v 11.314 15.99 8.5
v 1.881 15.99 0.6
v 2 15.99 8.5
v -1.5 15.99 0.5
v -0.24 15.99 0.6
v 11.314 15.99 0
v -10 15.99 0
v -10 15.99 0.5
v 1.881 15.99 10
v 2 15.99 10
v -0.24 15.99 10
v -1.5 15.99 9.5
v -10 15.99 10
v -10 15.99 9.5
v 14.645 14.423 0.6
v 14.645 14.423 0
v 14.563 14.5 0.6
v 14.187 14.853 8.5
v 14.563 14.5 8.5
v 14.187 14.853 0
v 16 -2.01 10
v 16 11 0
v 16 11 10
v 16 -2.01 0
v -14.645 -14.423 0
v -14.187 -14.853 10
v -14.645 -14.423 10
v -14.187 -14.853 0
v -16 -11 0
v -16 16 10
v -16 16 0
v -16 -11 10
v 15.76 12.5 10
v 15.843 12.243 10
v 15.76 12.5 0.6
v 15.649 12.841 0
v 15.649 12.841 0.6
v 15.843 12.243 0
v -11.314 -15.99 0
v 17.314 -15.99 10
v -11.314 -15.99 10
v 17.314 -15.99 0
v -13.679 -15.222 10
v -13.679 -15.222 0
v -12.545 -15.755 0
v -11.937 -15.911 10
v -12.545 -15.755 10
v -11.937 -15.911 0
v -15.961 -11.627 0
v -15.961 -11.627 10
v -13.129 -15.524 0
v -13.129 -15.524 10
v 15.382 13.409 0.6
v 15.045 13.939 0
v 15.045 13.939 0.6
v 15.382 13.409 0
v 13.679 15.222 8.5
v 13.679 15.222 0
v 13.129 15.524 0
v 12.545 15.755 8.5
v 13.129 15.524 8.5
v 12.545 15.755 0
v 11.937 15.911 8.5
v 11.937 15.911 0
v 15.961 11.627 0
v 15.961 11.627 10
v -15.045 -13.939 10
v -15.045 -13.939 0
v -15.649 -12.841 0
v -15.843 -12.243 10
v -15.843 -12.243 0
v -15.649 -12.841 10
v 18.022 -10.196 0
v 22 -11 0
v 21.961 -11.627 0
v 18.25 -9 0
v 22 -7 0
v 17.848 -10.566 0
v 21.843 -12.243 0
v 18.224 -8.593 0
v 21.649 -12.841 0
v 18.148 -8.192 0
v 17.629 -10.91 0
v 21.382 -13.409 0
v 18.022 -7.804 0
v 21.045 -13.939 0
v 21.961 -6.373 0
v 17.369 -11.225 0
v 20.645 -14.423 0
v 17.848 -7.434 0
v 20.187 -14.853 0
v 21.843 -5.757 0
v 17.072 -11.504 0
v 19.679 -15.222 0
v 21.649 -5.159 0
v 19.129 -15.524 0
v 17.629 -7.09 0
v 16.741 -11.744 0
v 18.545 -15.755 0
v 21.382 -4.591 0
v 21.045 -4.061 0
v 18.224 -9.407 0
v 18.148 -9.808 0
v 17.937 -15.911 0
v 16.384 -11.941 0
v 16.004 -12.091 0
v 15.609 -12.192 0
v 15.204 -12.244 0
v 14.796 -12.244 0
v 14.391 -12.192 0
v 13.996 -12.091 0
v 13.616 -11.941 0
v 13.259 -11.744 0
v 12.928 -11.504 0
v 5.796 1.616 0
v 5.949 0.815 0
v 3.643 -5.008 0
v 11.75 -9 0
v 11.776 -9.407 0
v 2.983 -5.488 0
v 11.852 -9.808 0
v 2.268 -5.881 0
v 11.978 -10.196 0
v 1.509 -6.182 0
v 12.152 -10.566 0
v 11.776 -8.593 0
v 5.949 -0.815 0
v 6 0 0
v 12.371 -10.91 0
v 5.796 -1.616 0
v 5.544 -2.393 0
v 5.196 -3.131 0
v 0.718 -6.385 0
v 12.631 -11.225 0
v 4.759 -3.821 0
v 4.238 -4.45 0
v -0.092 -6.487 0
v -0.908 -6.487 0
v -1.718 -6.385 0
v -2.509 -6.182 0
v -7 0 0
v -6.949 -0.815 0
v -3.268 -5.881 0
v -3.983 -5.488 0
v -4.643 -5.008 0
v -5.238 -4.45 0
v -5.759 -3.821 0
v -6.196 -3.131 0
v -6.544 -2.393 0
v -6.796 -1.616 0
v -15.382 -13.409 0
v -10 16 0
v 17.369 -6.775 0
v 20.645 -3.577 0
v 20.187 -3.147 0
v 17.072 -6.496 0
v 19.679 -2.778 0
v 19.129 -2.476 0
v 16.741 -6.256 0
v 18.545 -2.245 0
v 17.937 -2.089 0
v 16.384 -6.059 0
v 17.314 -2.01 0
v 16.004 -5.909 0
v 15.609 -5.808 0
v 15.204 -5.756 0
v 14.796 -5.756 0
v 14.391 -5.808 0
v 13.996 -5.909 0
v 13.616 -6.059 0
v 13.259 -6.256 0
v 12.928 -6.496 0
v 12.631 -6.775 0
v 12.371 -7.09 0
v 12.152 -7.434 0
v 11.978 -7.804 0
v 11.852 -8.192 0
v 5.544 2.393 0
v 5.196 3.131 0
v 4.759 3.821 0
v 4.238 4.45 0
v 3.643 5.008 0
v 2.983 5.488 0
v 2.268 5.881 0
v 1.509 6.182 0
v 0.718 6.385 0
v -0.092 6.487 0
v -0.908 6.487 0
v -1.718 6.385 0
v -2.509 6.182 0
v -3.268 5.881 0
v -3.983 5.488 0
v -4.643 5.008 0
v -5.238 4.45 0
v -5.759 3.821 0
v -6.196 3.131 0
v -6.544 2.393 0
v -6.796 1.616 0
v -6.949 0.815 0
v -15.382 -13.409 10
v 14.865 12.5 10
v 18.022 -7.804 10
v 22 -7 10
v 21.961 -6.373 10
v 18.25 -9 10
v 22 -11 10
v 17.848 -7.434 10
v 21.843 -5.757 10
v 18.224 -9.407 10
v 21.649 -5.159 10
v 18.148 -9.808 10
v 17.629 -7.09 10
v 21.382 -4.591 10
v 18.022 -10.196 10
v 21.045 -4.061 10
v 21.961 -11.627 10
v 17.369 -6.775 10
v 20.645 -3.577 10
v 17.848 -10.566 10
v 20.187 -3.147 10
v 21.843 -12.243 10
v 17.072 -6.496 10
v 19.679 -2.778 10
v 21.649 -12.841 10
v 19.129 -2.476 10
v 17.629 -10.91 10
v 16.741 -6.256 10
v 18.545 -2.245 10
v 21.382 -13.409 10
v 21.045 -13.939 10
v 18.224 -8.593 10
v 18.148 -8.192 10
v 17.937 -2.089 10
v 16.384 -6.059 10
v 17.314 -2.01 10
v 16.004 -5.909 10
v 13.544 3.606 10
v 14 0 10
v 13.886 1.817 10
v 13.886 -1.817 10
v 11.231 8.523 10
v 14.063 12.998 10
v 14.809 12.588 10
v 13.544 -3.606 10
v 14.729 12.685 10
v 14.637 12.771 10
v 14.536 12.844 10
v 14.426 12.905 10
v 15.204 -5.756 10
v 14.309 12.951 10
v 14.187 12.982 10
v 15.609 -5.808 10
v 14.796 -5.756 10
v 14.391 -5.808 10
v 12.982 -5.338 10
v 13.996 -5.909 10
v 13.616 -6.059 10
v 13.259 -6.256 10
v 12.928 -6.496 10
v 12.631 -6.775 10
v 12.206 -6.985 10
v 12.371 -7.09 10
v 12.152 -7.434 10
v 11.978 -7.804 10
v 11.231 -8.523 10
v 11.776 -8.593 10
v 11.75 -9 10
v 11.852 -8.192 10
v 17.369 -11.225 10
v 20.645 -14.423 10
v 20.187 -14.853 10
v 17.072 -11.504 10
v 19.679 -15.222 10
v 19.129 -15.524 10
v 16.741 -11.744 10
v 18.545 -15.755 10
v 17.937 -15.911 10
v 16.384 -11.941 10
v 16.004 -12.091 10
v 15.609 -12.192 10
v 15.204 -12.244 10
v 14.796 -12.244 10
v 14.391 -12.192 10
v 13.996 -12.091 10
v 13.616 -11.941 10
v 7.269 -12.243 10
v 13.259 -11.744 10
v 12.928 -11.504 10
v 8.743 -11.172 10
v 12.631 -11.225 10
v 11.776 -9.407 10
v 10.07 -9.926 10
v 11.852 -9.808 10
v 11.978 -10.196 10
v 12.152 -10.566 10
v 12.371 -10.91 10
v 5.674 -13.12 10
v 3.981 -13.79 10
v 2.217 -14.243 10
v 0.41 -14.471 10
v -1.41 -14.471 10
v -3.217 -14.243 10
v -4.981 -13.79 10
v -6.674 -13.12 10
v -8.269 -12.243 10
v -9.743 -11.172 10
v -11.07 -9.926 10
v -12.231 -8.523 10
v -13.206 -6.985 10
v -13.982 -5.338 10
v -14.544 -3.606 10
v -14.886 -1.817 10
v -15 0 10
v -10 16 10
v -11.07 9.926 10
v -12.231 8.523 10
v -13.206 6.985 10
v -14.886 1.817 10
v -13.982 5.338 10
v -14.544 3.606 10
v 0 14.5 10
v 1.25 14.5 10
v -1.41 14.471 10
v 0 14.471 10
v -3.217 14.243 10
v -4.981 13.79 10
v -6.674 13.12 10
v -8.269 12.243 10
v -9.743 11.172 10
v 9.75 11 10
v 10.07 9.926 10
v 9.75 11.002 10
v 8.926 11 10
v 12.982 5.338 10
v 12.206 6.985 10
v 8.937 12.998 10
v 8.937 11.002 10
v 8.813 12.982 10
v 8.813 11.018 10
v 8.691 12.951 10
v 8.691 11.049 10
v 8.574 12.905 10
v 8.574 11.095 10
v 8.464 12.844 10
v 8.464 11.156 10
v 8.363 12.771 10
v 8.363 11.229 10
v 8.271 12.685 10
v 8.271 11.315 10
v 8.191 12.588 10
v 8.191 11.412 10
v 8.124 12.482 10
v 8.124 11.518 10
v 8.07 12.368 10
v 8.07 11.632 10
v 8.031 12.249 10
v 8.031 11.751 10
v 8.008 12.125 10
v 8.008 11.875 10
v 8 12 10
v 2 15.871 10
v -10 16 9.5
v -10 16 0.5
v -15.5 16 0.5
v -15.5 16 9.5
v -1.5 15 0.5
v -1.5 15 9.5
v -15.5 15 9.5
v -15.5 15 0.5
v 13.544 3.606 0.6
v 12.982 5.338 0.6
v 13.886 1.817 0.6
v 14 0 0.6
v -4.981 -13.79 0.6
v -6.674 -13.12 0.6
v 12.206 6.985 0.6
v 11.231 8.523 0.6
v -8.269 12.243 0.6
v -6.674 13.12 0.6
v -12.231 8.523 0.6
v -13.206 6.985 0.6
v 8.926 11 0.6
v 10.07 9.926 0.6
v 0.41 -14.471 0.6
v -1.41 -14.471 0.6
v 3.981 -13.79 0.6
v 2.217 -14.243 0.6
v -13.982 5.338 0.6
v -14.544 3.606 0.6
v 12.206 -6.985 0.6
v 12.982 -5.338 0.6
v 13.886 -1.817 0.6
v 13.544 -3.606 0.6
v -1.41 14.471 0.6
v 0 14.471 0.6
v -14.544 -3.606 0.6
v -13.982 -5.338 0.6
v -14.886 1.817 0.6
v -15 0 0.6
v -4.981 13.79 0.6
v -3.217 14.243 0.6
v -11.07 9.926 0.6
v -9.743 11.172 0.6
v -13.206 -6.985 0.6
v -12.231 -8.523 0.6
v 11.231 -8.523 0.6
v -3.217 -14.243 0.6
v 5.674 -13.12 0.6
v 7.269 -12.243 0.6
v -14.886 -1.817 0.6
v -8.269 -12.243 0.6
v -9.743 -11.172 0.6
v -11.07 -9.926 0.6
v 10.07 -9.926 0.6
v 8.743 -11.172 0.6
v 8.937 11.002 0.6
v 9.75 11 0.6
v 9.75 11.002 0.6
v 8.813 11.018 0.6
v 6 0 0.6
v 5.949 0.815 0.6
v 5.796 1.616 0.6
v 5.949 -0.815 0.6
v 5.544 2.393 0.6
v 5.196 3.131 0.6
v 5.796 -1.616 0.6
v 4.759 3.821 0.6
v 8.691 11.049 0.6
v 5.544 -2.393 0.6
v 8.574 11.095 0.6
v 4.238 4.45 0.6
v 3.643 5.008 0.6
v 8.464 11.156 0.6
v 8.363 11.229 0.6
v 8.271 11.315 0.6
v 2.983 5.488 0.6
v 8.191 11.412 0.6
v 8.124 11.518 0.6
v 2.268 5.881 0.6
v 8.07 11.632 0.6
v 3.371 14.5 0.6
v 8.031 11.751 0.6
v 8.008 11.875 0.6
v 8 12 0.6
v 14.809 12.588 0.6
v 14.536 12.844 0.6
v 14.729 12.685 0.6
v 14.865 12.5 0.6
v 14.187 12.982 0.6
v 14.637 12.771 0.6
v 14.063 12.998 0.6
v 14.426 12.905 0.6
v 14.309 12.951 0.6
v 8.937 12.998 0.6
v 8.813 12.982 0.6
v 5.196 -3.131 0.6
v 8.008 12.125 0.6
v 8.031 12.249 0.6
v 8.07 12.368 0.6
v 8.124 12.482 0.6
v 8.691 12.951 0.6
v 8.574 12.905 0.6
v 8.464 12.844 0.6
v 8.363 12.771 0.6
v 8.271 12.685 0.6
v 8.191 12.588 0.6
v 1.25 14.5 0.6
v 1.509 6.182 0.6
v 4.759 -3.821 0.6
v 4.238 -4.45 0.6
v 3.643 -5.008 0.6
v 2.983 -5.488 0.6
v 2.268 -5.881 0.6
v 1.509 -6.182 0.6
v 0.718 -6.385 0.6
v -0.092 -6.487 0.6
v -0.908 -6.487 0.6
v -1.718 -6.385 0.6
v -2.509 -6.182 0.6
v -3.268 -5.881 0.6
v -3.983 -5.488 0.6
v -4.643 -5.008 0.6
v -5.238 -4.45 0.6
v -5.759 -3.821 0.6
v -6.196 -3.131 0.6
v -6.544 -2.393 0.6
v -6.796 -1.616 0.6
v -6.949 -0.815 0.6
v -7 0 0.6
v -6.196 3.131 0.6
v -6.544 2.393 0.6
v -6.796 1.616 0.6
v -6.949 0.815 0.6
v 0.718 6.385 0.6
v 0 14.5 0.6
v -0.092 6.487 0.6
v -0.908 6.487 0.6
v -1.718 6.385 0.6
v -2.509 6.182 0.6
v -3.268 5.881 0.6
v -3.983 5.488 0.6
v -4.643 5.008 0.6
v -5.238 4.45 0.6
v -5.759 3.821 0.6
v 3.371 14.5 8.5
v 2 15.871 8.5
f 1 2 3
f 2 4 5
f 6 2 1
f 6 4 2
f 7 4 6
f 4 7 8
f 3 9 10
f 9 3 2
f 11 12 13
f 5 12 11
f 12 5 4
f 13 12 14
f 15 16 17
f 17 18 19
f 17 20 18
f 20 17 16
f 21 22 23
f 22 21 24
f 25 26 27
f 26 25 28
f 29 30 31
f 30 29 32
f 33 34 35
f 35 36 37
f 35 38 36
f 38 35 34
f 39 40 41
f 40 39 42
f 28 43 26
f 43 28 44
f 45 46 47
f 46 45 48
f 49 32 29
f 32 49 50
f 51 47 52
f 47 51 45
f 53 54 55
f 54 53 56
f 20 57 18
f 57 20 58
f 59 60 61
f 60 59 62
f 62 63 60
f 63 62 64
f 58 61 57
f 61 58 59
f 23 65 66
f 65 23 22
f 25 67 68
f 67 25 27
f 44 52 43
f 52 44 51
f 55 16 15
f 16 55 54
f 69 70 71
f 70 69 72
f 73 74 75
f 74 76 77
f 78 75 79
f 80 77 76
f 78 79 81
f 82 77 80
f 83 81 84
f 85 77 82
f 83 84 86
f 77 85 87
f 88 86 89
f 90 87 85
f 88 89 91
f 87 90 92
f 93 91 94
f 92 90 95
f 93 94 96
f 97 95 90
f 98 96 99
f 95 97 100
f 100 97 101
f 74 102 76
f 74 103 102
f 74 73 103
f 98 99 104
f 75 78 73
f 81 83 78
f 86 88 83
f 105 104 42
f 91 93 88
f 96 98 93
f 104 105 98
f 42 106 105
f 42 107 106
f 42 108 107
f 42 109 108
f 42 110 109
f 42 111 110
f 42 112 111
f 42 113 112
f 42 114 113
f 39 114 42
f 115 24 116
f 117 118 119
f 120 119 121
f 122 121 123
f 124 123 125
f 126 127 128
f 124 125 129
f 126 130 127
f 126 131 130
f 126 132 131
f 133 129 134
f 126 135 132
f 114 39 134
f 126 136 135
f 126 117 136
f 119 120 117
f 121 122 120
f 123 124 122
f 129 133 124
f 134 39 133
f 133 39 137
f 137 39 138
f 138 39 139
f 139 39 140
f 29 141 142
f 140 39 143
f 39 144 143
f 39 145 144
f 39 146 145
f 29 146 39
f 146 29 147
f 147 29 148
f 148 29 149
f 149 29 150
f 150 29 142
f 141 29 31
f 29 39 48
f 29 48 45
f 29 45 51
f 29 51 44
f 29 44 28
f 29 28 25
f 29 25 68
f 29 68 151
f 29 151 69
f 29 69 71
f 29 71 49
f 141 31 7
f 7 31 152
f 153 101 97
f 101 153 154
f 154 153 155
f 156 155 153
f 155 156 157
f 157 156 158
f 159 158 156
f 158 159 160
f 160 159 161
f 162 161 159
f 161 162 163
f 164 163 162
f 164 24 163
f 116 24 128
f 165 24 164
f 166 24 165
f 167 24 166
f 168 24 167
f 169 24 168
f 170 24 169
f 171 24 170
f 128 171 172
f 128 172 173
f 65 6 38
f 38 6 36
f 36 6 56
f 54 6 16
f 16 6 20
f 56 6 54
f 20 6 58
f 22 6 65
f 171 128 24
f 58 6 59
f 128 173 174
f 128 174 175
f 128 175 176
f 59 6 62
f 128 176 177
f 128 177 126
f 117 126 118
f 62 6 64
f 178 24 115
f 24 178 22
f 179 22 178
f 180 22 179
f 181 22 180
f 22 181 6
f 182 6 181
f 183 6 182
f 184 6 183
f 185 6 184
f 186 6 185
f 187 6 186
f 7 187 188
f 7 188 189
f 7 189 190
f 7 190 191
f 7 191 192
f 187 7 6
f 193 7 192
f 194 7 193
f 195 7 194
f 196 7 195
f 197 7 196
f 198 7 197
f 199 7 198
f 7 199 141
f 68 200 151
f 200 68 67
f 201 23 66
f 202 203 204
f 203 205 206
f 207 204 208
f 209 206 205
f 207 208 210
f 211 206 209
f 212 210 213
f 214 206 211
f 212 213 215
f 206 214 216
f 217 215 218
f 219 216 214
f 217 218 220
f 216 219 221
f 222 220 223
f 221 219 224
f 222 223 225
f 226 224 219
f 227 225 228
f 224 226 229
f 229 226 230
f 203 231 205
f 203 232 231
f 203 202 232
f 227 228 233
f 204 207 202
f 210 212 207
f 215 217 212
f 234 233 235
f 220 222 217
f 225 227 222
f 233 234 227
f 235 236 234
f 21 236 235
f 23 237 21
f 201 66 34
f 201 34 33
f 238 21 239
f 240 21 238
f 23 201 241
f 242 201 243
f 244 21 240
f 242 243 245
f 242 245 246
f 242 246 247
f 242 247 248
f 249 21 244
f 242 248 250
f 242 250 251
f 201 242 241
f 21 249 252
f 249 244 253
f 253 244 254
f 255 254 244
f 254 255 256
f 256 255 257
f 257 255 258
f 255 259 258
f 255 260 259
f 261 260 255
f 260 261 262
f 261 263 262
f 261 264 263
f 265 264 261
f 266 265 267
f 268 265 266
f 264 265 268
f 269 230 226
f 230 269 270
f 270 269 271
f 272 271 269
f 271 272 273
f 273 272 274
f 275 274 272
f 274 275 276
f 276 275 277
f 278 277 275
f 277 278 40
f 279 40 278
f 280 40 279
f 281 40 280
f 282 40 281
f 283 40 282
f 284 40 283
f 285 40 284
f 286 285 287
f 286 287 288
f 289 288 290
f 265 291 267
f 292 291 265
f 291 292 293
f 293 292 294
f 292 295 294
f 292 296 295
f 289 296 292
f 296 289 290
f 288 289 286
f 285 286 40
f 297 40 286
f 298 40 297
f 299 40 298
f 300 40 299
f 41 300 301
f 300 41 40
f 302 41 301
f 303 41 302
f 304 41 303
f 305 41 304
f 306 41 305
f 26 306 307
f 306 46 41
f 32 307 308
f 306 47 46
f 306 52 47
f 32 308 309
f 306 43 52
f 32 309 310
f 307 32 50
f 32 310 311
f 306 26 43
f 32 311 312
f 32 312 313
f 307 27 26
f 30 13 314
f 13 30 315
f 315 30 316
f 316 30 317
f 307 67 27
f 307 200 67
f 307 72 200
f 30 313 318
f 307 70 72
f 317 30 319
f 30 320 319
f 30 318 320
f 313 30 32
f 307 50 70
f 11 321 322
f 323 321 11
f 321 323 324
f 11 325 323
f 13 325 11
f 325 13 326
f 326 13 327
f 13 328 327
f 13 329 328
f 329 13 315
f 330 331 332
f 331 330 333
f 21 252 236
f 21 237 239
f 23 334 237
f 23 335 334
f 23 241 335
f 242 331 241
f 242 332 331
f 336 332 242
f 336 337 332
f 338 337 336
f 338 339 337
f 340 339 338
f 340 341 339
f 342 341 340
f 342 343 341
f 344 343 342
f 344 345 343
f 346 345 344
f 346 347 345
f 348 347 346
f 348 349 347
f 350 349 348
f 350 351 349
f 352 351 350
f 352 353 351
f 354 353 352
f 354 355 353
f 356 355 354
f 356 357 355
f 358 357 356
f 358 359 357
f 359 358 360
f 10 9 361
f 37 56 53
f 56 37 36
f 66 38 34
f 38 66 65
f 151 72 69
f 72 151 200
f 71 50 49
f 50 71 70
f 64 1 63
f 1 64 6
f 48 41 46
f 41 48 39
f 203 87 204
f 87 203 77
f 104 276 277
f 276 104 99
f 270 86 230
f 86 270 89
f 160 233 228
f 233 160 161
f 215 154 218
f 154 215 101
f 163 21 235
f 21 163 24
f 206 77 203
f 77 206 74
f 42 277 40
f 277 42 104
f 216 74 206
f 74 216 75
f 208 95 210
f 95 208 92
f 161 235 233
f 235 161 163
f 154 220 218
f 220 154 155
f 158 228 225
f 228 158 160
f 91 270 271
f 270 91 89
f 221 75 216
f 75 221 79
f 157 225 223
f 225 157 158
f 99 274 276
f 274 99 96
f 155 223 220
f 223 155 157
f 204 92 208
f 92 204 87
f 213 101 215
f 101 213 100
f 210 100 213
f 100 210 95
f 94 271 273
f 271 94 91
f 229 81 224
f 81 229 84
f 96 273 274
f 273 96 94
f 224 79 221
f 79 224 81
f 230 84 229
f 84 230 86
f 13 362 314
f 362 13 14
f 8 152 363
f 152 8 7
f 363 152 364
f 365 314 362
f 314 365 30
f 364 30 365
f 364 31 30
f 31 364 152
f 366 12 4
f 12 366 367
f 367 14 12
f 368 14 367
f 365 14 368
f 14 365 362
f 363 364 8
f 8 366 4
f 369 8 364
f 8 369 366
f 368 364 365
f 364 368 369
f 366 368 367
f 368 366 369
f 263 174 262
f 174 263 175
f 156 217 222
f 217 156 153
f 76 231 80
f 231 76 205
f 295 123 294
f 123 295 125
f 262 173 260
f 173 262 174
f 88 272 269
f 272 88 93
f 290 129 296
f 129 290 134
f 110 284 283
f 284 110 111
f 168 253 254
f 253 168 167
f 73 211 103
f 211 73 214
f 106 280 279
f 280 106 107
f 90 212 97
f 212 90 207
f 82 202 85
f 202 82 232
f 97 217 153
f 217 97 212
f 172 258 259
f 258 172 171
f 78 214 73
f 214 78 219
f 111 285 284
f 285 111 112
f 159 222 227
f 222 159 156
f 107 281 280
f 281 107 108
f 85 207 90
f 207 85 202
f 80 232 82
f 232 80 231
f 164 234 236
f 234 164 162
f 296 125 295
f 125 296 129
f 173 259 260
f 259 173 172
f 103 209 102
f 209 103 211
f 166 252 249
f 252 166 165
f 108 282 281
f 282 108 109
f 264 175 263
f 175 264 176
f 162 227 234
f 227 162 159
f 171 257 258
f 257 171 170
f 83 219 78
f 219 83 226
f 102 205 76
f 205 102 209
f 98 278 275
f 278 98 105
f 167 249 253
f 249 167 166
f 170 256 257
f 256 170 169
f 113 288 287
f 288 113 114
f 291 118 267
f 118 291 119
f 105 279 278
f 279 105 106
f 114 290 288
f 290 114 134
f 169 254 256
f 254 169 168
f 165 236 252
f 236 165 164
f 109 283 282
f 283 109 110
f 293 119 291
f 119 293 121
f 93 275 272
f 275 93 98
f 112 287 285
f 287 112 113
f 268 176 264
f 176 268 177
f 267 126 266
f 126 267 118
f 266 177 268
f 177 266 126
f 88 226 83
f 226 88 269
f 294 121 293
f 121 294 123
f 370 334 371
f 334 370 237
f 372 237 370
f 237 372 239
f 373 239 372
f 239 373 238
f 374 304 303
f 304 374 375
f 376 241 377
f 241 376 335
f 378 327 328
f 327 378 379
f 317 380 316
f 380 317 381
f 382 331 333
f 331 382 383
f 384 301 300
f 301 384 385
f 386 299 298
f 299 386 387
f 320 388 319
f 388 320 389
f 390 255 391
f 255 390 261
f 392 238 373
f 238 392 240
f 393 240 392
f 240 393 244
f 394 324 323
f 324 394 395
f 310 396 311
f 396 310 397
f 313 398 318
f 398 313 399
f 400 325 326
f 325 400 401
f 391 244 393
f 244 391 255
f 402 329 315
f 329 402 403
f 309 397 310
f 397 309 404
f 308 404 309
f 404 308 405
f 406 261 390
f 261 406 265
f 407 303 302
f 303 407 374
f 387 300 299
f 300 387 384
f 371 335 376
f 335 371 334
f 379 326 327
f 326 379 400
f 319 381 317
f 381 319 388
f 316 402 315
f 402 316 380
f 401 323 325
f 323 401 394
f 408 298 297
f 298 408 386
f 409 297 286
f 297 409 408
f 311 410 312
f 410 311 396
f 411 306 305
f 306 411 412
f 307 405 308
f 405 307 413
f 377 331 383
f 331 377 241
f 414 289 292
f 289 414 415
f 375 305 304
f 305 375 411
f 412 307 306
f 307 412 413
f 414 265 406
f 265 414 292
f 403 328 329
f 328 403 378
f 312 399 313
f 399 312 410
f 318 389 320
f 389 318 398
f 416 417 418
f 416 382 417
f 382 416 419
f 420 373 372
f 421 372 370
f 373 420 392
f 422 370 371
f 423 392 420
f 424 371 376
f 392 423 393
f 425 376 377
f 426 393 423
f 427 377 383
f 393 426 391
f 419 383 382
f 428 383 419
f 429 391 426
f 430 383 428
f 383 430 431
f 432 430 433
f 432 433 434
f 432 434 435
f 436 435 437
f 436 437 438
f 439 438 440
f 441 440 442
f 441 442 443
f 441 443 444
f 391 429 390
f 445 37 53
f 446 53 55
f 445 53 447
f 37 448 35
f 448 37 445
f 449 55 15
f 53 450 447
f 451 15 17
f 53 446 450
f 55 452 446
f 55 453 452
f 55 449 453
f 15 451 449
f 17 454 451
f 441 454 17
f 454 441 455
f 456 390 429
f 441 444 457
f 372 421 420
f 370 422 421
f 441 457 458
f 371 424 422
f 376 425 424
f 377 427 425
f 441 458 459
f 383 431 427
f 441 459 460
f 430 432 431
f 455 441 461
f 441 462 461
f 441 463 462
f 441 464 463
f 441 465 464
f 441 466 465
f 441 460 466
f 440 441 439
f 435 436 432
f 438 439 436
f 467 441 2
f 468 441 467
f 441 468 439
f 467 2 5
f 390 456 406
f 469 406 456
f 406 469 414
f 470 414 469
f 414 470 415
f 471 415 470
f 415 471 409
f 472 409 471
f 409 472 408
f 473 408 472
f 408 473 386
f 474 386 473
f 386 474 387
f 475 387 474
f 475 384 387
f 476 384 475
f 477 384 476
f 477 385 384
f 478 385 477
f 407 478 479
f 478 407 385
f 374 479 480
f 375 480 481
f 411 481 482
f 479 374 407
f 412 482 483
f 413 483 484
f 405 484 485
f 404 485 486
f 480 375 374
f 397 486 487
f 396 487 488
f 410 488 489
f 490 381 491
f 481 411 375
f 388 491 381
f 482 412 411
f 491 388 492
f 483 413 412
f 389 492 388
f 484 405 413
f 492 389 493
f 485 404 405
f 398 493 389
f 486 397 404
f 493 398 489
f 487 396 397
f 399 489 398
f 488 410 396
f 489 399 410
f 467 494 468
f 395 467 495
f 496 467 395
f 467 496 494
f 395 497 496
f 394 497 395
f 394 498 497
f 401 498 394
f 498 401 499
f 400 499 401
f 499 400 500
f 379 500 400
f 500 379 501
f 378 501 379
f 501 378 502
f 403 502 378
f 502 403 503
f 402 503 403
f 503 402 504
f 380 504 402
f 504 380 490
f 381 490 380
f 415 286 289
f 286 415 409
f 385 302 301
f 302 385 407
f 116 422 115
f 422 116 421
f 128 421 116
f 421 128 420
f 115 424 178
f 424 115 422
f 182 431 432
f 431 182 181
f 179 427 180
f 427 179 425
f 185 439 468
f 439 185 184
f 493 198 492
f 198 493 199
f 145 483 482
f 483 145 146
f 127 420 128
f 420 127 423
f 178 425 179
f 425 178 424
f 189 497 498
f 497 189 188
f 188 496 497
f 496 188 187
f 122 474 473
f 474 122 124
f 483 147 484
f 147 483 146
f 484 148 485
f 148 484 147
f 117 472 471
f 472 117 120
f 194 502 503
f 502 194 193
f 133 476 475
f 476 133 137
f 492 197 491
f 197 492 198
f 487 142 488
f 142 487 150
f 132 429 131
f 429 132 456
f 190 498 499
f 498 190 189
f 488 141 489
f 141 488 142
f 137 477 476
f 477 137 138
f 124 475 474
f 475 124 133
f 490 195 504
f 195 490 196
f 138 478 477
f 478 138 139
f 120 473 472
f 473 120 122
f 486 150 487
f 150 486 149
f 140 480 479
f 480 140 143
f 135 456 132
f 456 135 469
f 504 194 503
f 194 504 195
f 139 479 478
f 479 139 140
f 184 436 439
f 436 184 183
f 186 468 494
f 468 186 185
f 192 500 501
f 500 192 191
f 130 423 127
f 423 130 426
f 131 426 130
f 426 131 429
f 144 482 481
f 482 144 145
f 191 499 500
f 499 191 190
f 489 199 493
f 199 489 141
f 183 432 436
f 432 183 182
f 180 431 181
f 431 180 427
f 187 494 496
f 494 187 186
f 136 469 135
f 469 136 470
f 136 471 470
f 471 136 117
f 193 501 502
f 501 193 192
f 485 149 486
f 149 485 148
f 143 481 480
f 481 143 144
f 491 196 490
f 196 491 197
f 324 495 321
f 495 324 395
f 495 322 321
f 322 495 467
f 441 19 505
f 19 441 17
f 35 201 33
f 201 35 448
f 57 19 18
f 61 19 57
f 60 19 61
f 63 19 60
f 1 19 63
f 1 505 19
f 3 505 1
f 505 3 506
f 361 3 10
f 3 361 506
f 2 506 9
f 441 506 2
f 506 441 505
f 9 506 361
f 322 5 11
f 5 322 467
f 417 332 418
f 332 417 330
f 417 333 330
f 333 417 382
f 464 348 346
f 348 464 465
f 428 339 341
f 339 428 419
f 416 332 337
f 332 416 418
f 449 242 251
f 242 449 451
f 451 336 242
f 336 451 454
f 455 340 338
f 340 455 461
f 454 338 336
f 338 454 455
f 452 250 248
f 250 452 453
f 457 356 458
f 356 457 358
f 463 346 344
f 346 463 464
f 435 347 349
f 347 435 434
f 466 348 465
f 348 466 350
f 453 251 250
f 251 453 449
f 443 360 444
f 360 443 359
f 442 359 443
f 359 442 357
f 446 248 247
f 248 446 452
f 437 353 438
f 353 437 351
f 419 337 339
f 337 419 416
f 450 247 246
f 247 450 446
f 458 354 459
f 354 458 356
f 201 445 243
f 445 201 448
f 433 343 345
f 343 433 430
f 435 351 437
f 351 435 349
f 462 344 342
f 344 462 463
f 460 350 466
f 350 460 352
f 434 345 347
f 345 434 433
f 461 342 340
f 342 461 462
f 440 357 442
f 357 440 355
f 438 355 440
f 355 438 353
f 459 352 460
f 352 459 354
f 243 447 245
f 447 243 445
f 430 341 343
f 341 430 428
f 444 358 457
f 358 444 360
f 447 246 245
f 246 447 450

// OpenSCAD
$fn = 50;


union() {
	difference() {
		union() {
			translate(v = [0, 0, 0]) {
				rotate(a = [0, 0, 0]) {
					hull() {
						translate(v = [-11.0000000000, 11.0000000000, 0]) {
							rotate(a = [0, 0, 0]) {
								translate(v = [0, 0, 0]) {
									rotate(a = [0, 0, 0]) {
										cylinder(h = 10, r = 5);
									}
								}
							}
						}
						translate(v = [11.0000000000, 11.0000000000, 0]) {
							rotate(a = [0, 0, 0]) {
								translate(v = [0, 0, 0]) {
									rotate(a = [0, 0, 0]) {
										cylinder(h = 10, r = 5);
									}
								}
							}
						}
						translate(v = [-11.0000000000, -11.0000000000, 0]) {
							rotate(a = [0, 0, 0]) {
								translate(v = [0, 0, 0]) {
									rotate(a = [0, 0, 0]) {
										cylinder(h = 10, r = 5);
									}
								}
							}
						}
						translate(v = [11.0000000000, -11.0000000000, 0]) {
							rotate(a = [0, 0, 0]) {
								translate(v = [0, 0, 0]) {
									rotate(a = [0, 0, 0]) {
										cylinder(h = 10, r = 5);
									}
								}
							}
						}
					}
				}
			}
			translate(v = [7.5000000000, -9.0000000000, 0]) {
				rotate(a = [0, 0, 0]) {
					hull() {
						translate(v = [-9.5000000000, 2.0000000000, 0]) {
							rotate(a = [0, 0, 0]) {
								translate(v = [0, 0, 0]) {
									rotate(a = [0, 0, 0]) {
										cylinder(h = 10, r = 5);
									}
								}
							}
						}
						translate(v = [9.5000000000, 2.0000000000, 0]) {
							rotate(a = [0, 0, 0]) {
								translate(v = [0, 0, 0]) {
									rotate(a = [0, 0, 0]) {
										cylinder(h = 10, r = 5);
									}
								}
							}
						}
						translate(v = [-9.5000000000, -2.0000000000, 0]) {
							rotate(a = [0, 0, 0]) {
								translate(v = [0, 0, 0]) {
									rotate(a = [0, 0, 0]) {
										cylinder(h = 10, r = 5);
									}
								}
							}
						}
						translate(v = [9.5000000000, -2.0000000000, 0]) {
							rotate(a = [0, 0, 0]) {
								translate(v = [0, 0, 0]) {
									rotate(a = [0, 0, 0]) {
										cylinder(h = 10, r = 5);
									}
								}
							}
						}
					}
				}
			}
			translate(v = [-16.0000000000, 10.0000000000, 0]) {
				rotate(a = [0, 0, 0]) {
					cube(size = [6, 6, 10]);
				}
			}
		}
		union() {
			translate(v = [-15.5000000000, 15.0000000000, 0.5000000000]) {
				rotate(a = [0, 0, 0]) {
					cube(size = [14, 1, 9.0000000000]);
				}
			}
			translate(v = [15.0000000000, -9.0000000000, -125.0000000000]) {
				rotate(a = [0, 0, 0]) {
					cylinder(h = 250, r = 3.2500000000);
				}
			}
			translate(v = [-0.5000000000, 0.0000000000, 0.6000000000]) {
				rotate(a = [0, 0, 0]) {
					cylinder(h = 12.4000000000, r = 14.5000000000);
				}
			}
			translate(v = [-0.5000000000, 0.0000000000, -5.0000000000]) {
				rotate(a = [0, 0, 0]) {
					cylinder(h = 10, r = 6.5000000000);
				}
			}
			translate(v = [0.0000000000, 12.5000000000, 0.6000000000]) {
				rotate(a = [0, 0, 0]) {
					cube(size = [16.0000000000, 2, 12.4000000000]);
				}
			}
			translate(v = [2.0000000000, 12.5000000000, 8.5000000000]) {
				rotate(a = [0, 0, 0]) {
					cube(size = [14.0000000000, 5, 1.5000000000]);
				}
			}
			translate(v = [-3.0000000000, 18.7500000000, 0.6000000000]) {
				rotate(a = [0, 0, -45]) {
					cube(size = [10, 1.5000000000, 12.4000000000]);
				}
			}
			translate(v = [2.2500000000, 11.0000000000, 0.6000000000]) {
				rotate(a = [0, 0, 0]) {
					cube(size = [7.5000000000, 2, 9.4000000000]);
				}
			}
		}
	}
	union() {
		translate(v = [11.5000000000, 12, 0]) {
			rotate(a = [0, 0, 0]) {
				hull() {
					translate(v = [2.5000000000, 0, 0]) {
						rotate(a = [0, 0, 0]) {
							translate(v = [0, 0, 0]) {
								rotate(a = [0, 0, 0]) {
									cylinder(h = 10, r = 1.0000000000);
								}
							}
						}
					}
					translate(v = [-2.5000000000, 0, 0]) {
						rotate(a = [0, 0, 0]) {
							translate(v = [0, 0, 0]) {
								rotate(a = [0, 0, 0]) {
									cylinder(h = 10, r = 1.0000000000);
								}
							}
						}
					}
				}
			}
		}
	}
}
